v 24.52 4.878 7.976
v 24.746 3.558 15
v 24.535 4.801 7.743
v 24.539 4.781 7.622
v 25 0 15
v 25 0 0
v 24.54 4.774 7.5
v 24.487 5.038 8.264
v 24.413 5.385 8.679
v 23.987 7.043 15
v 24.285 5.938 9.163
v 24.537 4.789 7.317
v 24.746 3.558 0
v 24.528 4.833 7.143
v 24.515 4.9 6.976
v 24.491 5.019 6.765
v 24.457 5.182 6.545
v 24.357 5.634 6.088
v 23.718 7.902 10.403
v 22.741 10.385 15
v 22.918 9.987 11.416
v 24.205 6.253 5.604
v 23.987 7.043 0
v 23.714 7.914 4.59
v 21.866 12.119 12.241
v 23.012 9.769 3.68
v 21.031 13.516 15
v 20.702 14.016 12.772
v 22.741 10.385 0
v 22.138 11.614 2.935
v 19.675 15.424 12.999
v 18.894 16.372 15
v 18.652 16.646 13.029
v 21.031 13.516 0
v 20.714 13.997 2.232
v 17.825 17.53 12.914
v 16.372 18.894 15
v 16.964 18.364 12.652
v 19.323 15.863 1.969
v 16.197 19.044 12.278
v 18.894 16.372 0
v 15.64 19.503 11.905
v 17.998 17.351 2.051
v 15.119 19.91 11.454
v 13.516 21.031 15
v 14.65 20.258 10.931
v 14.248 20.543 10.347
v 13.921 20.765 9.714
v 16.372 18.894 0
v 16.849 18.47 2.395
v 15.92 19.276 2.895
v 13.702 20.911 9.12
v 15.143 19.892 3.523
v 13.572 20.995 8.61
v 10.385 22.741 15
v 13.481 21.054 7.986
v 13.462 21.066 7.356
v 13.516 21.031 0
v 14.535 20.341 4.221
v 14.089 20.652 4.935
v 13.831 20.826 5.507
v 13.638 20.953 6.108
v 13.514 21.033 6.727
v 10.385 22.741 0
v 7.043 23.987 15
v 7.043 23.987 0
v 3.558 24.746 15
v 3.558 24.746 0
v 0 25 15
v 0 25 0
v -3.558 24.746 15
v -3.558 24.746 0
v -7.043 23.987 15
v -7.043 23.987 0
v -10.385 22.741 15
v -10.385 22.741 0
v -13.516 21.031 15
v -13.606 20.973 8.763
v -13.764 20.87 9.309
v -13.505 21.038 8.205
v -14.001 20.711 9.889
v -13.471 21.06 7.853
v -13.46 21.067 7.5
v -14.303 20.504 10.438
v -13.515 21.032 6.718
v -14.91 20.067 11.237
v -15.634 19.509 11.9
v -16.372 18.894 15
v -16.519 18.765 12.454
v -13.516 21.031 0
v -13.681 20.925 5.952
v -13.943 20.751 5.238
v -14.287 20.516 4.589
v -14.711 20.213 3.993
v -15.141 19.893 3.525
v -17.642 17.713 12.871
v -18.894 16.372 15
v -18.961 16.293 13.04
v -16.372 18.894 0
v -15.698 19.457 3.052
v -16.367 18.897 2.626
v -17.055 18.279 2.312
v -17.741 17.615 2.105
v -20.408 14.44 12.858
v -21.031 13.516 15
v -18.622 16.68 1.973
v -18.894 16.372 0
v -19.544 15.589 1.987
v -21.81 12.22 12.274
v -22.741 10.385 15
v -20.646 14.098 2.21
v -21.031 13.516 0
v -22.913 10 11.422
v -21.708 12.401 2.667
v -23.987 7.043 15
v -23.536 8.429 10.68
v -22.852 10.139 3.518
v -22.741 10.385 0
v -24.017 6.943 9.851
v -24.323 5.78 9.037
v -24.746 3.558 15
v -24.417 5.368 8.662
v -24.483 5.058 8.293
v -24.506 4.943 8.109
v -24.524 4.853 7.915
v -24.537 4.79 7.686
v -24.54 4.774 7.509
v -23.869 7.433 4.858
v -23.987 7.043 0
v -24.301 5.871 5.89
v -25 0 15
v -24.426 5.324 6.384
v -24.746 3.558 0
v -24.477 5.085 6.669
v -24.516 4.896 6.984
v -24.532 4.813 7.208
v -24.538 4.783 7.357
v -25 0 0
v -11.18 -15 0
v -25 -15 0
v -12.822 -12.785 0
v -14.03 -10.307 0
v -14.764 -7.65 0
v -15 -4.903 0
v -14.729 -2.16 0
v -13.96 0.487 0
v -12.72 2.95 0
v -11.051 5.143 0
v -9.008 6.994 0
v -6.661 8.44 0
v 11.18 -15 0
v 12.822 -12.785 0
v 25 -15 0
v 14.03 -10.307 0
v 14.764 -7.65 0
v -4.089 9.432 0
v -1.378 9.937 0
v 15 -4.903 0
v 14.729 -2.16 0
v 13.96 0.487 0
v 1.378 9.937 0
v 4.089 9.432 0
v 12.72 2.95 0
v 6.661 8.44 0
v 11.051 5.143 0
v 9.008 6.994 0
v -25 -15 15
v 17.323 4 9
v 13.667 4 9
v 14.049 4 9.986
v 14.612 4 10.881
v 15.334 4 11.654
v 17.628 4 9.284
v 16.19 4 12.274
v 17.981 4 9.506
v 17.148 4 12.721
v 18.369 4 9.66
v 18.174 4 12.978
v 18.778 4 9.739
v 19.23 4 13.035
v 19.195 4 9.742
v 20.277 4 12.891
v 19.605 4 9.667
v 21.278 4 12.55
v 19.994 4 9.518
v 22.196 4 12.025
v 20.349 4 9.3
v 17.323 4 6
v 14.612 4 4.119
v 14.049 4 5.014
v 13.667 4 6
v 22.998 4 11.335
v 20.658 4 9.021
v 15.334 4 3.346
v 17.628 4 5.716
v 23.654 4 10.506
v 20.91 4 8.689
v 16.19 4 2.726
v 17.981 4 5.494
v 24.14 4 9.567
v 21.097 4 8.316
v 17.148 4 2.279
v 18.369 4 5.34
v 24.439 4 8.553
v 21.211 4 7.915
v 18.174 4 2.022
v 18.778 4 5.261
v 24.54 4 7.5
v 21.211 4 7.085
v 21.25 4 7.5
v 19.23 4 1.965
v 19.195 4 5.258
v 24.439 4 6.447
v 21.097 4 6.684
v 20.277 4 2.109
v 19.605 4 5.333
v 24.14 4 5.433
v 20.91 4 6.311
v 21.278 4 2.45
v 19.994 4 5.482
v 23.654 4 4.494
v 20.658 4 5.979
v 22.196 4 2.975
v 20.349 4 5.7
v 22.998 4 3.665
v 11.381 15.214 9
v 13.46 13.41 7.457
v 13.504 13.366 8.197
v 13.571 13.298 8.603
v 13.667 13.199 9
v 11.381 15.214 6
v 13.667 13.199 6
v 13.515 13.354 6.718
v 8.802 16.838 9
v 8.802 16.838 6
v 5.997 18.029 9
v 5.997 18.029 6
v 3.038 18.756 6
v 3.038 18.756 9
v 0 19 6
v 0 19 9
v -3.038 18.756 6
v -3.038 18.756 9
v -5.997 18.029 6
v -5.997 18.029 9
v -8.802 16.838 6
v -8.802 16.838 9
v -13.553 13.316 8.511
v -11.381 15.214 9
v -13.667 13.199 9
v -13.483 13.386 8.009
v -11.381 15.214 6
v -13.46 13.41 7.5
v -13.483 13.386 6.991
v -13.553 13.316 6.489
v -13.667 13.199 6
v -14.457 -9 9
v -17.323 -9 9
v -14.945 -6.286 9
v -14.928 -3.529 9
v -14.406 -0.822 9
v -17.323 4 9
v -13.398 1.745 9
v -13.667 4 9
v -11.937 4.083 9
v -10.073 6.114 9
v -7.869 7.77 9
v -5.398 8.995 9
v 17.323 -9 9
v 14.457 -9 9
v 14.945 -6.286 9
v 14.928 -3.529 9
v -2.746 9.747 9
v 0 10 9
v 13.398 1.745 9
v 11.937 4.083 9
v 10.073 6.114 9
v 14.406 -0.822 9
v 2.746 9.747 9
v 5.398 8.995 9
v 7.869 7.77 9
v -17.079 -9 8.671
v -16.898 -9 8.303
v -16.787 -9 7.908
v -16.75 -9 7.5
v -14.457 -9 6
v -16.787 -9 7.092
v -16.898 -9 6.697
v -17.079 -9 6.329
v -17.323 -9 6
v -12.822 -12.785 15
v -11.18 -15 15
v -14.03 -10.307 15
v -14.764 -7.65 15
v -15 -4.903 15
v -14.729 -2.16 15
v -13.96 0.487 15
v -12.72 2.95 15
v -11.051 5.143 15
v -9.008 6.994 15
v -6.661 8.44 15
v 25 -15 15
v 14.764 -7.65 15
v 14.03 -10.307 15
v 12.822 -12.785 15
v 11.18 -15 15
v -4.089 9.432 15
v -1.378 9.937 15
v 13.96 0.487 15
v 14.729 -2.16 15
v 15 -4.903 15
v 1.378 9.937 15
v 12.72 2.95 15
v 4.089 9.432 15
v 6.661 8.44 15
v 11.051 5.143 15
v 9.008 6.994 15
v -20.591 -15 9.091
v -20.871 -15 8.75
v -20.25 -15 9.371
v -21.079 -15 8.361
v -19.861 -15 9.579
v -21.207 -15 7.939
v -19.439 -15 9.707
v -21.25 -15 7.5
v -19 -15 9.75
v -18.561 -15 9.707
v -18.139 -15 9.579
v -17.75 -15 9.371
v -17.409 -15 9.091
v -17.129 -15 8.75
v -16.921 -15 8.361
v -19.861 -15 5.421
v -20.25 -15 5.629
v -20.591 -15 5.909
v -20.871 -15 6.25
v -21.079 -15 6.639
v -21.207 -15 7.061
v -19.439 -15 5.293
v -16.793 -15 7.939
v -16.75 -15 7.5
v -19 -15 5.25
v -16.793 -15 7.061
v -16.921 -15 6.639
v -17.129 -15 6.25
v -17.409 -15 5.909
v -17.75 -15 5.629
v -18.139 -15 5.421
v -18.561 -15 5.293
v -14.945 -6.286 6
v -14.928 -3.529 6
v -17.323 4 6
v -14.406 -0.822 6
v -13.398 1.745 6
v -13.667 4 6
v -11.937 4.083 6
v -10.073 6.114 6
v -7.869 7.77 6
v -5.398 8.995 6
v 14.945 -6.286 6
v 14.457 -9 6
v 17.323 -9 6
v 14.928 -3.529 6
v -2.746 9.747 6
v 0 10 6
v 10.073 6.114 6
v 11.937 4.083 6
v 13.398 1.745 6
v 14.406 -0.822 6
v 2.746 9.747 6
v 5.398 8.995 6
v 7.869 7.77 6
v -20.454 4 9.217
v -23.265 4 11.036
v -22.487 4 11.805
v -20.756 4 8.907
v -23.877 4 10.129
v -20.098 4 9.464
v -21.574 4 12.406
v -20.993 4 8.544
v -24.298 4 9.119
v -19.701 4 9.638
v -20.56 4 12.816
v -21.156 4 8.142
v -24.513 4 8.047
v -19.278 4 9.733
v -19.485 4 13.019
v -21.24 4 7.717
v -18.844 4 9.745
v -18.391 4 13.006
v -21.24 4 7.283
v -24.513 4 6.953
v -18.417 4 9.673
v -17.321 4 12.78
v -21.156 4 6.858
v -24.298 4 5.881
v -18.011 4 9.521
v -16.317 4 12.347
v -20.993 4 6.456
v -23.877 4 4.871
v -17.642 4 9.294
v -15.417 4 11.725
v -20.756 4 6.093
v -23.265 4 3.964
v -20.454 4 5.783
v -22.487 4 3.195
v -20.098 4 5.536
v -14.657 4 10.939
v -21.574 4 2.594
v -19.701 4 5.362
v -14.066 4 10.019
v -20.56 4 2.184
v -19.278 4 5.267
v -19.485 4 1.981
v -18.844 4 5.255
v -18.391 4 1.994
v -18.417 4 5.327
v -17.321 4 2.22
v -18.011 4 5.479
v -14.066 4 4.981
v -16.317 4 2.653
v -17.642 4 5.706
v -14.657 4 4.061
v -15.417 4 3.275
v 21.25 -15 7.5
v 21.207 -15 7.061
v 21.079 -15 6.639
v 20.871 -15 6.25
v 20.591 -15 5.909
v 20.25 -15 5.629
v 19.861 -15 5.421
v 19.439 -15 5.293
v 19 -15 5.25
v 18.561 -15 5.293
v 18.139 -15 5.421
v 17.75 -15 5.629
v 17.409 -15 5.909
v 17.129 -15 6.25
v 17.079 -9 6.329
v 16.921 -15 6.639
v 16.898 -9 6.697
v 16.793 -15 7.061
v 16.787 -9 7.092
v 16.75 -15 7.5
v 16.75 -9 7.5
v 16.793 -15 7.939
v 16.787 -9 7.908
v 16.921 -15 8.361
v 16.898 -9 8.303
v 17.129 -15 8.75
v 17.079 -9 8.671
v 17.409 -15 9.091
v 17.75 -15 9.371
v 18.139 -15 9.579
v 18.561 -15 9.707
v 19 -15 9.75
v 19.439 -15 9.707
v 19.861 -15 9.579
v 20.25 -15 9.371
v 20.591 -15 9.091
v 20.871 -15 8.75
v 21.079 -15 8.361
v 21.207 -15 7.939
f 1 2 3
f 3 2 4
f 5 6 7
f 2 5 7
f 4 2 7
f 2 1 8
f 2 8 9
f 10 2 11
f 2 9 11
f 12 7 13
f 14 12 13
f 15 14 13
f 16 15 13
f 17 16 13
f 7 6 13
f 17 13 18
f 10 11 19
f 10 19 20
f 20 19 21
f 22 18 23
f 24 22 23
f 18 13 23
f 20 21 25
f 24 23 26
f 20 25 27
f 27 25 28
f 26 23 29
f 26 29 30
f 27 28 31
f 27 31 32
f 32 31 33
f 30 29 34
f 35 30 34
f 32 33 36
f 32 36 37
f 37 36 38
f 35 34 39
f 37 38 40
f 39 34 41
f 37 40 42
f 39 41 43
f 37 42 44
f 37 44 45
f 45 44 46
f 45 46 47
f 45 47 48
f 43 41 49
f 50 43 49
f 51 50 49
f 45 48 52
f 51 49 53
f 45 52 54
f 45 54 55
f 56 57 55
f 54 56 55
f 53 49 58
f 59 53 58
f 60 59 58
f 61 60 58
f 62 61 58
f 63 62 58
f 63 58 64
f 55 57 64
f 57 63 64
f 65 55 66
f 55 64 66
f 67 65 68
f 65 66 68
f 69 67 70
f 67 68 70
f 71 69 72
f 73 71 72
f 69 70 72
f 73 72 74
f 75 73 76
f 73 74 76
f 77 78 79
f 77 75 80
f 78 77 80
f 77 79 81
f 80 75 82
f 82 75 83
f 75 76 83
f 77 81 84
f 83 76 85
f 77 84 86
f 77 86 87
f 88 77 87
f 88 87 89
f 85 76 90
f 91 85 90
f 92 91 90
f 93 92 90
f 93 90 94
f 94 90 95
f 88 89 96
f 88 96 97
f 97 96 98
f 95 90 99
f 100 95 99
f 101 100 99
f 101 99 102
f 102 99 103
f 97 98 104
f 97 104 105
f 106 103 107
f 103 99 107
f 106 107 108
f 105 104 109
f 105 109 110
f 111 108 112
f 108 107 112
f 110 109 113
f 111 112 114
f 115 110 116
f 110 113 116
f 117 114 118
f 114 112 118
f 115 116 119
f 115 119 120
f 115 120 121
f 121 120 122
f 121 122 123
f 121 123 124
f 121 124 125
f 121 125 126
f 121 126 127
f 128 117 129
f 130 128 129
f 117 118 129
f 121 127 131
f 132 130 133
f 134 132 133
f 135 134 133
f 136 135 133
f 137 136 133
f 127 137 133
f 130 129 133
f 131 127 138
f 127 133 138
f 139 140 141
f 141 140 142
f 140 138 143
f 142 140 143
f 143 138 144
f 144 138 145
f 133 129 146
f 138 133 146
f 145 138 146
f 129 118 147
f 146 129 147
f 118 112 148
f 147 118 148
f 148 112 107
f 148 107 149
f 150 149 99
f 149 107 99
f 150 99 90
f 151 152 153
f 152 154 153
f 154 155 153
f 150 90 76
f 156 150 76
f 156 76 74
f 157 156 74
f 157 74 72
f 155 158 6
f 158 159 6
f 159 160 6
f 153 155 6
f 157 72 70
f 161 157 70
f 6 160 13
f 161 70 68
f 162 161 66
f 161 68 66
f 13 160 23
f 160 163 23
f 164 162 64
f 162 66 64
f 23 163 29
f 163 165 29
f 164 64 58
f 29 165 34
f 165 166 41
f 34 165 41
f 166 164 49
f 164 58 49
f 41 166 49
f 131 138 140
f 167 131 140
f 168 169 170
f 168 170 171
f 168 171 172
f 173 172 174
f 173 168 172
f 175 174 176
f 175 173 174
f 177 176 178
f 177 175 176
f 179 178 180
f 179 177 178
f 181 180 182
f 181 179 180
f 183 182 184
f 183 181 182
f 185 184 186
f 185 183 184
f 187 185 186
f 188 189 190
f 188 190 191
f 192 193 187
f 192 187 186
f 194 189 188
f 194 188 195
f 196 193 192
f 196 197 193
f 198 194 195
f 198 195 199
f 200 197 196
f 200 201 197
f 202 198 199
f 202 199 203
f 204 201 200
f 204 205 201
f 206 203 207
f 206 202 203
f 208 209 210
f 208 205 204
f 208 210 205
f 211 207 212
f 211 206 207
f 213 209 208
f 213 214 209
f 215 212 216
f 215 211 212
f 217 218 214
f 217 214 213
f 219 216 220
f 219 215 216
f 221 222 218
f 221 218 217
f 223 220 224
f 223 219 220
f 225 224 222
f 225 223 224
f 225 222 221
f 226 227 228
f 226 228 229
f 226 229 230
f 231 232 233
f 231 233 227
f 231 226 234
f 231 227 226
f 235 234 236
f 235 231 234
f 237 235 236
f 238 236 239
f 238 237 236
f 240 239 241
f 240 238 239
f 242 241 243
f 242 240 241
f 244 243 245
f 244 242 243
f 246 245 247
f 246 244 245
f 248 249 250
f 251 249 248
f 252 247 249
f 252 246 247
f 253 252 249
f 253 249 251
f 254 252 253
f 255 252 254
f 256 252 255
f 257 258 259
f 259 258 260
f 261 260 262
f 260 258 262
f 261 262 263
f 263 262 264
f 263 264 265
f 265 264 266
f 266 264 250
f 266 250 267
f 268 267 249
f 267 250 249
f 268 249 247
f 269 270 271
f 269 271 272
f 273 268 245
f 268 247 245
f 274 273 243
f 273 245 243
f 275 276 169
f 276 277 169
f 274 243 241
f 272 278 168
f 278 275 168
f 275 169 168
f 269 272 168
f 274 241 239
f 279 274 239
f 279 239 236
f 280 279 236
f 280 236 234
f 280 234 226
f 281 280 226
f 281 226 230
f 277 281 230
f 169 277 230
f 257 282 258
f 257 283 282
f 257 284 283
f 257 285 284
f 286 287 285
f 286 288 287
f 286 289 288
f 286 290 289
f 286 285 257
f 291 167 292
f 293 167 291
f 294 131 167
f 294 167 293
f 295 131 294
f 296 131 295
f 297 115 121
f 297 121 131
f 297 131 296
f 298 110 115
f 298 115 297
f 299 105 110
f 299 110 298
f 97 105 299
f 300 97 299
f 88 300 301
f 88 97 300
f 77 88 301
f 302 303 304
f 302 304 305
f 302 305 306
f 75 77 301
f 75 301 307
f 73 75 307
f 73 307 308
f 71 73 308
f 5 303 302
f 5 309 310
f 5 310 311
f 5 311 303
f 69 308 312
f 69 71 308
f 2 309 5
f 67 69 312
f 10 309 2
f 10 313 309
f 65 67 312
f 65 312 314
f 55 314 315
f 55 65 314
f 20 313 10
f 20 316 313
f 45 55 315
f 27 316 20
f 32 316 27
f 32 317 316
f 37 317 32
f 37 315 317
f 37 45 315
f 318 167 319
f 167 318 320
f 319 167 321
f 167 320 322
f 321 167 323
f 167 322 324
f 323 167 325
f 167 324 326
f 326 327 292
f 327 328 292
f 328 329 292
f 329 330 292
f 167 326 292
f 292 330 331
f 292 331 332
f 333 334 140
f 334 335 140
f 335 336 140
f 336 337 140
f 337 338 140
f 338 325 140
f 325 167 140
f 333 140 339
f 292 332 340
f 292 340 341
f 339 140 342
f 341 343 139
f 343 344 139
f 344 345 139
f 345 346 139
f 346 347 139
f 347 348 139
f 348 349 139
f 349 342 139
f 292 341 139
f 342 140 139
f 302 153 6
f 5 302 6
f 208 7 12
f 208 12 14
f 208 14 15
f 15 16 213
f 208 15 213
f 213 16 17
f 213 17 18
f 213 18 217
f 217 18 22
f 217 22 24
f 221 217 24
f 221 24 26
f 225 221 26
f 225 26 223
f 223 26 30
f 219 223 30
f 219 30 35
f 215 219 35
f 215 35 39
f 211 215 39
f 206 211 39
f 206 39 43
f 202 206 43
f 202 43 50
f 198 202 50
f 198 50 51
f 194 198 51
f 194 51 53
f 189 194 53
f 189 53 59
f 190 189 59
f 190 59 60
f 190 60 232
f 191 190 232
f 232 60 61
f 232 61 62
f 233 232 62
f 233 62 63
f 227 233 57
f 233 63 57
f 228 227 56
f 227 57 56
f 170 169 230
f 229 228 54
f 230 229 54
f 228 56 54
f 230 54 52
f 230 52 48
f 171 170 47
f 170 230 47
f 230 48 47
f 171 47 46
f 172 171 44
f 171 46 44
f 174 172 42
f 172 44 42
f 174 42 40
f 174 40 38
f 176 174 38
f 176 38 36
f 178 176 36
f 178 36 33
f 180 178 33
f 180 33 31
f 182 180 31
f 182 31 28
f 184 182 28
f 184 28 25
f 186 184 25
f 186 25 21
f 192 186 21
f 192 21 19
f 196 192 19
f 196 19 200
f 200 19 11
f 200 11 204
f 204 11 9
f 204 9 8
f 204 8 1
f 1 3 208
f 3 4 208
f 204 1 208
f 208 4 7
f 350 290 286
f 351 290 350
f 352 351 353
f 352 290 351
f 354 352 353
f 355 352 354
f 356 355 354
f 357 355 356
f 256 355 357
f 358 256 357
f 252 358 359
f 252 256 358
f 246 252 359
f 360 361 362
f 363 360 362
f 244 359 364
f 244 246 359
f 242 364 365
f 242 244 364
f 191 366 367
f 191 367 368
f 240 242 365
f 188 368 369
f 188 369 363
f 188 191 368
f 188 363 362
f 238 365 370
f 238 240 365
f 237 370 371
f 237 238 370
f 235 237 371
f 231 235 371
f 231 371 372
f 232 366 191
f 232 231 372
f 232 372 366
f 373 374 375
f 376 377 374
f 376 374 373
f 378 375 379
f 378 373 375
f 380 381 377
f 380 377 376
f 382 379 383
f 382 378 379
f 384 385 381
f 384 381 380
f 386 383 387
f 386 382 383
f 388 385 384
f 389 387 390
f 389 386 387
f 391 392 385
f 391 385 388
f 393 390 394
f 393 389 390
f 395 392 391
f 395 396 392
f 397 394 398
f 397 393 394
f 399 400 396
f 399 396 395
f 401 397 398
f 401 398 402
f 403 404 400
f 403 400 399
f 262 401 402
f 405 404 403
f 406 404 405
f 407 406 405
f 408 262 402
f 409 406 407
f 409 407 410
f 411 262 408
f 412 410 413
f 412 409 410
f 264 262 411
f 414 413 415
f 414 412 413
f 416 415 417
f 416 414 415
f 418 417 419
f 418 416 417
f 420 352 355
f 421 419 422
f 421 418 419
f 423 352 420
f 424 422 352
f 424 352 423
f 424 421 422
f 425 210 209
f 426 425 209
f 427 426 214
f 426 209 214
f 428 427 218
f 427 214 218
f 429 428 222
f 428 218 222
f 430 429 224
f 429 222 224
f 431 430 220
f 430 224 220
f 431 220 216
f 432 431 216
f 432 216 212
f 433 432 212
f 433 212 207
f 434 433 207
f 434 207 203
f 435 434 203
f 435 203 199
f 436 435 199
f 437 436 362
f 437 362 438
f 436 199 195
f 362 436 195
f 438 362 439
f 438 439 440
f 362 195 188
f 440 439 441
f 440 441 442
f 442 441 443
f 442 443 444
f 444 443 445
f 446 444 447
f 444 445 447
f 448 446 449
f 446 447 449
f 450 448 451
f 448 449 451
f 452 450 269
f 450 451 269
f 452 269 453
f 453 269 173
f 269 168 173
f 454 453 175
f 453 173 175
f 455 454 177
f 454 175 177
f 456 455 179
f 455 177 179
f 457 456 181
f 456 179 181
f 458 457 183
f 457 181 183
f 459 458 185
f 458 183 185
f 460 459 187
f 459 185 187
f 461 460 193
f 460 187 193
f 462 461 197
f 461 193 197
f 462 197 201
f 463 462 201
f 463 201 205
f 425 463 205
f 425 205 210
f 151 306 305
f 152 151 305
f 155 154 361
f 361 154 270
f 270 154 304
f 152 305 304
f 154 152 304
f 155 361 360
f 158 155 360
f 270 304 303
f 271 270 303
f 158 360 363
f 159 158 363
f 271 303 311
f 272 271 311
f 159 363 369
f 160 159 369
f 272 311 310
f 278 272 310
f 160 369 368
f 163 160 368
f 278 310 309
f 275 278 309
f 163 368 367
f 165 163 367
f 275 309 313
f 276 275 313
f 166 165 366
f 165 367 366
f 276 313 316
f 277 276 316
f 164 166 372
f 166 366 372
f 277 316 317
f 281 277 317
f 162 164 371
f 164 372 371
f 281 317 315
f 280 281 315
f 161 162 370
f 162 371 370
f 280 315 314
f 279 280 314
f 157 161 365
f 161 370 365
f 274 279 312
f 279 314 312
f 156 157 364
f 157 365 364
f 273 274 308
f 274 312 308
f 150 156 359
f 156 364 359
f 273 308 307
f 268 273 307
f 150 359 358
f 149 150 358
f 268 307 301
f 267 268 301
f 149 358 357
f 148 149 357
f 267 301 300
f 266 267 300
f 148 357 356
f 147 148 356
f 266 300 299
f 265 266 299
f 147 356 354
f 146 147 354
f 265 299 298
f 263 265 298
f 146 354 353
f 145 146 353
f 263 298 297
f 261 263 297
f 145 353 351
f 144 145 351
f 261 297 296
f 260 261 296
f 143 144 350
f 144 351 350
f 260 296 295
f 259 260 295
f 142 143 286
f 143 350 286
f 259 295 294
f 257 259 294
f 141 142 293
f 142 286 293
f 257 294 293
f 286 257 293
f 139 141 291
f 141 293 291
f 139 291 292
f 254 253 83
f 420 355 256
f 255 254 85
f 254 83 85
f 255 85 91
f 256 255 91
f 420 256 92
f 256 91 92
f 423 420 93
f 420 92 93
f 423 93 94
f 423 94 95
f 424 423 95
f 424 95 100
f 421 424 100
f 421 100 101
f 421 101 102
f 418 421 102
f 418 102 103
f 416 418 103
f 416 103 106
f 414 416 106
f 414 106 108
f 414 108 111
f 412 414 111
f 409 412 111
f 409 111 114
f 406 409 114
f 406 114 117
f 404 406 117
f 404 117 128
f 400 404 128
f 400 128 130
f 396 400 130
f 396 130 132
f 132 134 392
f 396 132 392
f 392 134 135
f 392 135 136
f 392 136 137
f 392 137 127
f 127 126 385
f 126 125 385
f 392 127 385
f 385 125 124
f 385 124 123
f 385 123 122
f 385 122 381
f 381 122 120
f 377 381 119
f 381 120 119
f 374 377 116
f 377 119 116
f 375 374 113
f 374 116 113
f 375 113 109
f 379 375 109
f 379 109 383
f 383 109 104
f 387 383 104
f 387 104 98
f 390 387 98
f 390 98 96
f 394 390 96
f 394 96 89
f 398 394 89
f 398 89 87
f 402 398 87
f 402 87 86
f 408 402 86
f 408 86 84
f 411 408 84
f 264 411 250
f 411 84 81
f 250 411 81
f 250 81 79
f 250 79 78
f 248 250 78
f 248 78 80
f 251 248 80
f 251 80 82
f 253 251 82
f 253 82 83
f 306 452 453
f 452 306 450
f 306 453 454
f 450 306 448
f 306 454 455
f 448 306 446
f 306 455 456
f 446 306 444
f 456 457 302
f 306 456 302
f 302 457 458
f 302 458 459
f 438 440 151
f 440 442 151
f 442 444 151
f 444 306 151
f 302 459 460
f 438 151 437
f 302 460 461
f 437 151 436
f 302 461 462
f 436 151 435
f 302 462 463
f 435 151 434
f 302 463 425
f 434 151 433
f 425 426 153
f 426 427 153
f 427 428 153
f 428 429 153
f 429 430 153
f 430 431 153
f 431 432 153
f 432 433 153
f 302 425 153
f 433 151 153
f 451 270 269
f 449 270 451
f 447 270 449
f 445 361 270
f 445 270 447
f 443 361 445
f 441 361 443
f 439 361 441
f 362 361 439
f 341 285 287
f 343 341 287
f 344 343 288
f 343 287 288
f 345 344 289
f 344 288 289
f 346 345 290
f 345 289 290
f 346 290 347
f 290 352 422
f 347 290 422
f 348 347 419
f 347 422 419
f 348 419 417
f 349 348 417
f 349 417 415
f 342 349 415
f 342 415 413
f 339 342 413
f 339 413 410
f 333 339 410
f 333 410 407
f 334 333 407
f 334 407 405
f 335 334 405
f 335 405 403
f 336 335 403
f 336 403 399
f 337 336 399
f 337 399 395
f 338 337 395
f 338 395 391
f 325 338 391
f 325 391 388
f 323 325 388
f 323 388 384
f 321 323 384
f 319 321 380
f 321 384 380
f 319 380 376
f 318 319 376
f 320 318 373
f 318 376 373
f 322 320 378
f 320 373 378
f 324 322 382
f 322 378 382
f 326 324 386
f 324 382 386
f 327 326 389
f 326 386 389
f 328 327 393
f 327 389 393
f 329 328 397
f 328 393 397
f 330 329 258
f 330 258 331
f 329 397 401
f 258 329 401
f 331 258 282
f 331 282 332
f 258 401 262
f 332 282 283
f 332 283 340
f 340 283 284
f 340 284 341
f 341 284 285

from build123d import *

# Parameters (mm, degrees)
BOSS_EXTRUDE1_DEPTH = 15
SHELL2_T            = 6
CUT_EXTRUDE1_REACH  = 17
SKETCH2_R           = 15
CUT_EXTRUDE2_REACH  = 42
SKETCH3_R           = 2.25
SKETCH5_R           = 5.54
CUT_EXTRUDE3_DEPTH  = 21


with BuildPart() as part:
    # Sketch1 → Boss-Extrude1 (new body)
    with BuildSketch(Plane.XY):
        with BuildLine():
            Line((-25, 0), (-25, -15))
            Line((-25, -15), (25, -15))
            Line((25, -15), (25, 0))
            ThreePointArc((25, 0), (0, 25), (-25, 0))
        make_face()
    extrude(amount=BOSS_EXTRUDE1_DEPTH)

    # Shell2 (no face opened: a closed hollow body)
    add(offset(amount=-SHELL2_T, mode=Mode.PRIVATE), mode=Mode.SUBTRACT)

    # Sketch2 → Cut-Extrude1 (cut, up to next)
    with BuildSketch(Plane.XY.offset(15), mode=Mode.PRIVATE) as cut_extrude1_sk1:
        with Locations((0, -5)):
            Circle(SKETCH2_R)
    cut_extrude1_tool1 = extrude(cut_extrude1_sk1.sketch, amount=-CUT_EXTRUDE1_REACH, mode=Mode.PRIVATE) & part.part
    add(cut_extrude1_tool1.solids().sort_by_distance((0, -5, 15))[0], mode=Mode.SUBTRACT)

    # Sketch3 → Cut-Extrude2 (cut, up to next)
    with BuildSketch(Plane(origin=(0, 25, 0), x_dir=(1, 0, 0), z_dir=(0, 1, 0)), mode=Mode.PRIVATE) as cut_extrude2_sk1:
        with Locations((-19, -7.5)):
            Circle(SKETCH3_R)
    cut_extrude2_tool1 = extrude(cut_extrude2_sk1.sketch, amount=-CUT_EXTRUDE2_REACH, mode=Mode.PRIVATE) & part.part
    add(cut_extrude2_tool1.solids().sort_by_distance((-19, 25, 7.5))[0], mode=Mode.SUBTRACT)
    # Sketch3 → Cut-Extrude2 (cut, up to next)
    with BuildSketch(Plane(origin=(0, 25, 0), x_dir=(1, 0, 0), z_dir=(0, 1, 0)), mode=Mode.PRIVATE) as cut_extrude2_sk2:
        with Locations((19, -7.5)):
            Circle(SKETCH3_R)
    cut_extrude2_tool2 = extrude(cut_extrude2_sk2.sketch, amount=-CUT_EXTRUDE2_REACH, mode=Mode.PRIVATE) & part.part
    add(cut_extrude2_tool2.solids().sort_by_distance((19, 25, 7.5))[0], mode=Mode.SUBTRACT)

    # Sketch5 → Cut-Extrude3 (cut)
    with BuildSketch(Plane(origin=(0, 25, 0), x_dir=(1, 0, 0), z_dir=(0, 1, 0))):
        with Locations((19, -7.5)):
            Circle(SKETCH5_R)
        with Locations((-19, -7.5)):
            Circle(SKETCH5_R)
    extrude(amount=-CUT_EXTRUDE3_DEPTH, mode=Mode.SUBTRACT)


solid = part.part
